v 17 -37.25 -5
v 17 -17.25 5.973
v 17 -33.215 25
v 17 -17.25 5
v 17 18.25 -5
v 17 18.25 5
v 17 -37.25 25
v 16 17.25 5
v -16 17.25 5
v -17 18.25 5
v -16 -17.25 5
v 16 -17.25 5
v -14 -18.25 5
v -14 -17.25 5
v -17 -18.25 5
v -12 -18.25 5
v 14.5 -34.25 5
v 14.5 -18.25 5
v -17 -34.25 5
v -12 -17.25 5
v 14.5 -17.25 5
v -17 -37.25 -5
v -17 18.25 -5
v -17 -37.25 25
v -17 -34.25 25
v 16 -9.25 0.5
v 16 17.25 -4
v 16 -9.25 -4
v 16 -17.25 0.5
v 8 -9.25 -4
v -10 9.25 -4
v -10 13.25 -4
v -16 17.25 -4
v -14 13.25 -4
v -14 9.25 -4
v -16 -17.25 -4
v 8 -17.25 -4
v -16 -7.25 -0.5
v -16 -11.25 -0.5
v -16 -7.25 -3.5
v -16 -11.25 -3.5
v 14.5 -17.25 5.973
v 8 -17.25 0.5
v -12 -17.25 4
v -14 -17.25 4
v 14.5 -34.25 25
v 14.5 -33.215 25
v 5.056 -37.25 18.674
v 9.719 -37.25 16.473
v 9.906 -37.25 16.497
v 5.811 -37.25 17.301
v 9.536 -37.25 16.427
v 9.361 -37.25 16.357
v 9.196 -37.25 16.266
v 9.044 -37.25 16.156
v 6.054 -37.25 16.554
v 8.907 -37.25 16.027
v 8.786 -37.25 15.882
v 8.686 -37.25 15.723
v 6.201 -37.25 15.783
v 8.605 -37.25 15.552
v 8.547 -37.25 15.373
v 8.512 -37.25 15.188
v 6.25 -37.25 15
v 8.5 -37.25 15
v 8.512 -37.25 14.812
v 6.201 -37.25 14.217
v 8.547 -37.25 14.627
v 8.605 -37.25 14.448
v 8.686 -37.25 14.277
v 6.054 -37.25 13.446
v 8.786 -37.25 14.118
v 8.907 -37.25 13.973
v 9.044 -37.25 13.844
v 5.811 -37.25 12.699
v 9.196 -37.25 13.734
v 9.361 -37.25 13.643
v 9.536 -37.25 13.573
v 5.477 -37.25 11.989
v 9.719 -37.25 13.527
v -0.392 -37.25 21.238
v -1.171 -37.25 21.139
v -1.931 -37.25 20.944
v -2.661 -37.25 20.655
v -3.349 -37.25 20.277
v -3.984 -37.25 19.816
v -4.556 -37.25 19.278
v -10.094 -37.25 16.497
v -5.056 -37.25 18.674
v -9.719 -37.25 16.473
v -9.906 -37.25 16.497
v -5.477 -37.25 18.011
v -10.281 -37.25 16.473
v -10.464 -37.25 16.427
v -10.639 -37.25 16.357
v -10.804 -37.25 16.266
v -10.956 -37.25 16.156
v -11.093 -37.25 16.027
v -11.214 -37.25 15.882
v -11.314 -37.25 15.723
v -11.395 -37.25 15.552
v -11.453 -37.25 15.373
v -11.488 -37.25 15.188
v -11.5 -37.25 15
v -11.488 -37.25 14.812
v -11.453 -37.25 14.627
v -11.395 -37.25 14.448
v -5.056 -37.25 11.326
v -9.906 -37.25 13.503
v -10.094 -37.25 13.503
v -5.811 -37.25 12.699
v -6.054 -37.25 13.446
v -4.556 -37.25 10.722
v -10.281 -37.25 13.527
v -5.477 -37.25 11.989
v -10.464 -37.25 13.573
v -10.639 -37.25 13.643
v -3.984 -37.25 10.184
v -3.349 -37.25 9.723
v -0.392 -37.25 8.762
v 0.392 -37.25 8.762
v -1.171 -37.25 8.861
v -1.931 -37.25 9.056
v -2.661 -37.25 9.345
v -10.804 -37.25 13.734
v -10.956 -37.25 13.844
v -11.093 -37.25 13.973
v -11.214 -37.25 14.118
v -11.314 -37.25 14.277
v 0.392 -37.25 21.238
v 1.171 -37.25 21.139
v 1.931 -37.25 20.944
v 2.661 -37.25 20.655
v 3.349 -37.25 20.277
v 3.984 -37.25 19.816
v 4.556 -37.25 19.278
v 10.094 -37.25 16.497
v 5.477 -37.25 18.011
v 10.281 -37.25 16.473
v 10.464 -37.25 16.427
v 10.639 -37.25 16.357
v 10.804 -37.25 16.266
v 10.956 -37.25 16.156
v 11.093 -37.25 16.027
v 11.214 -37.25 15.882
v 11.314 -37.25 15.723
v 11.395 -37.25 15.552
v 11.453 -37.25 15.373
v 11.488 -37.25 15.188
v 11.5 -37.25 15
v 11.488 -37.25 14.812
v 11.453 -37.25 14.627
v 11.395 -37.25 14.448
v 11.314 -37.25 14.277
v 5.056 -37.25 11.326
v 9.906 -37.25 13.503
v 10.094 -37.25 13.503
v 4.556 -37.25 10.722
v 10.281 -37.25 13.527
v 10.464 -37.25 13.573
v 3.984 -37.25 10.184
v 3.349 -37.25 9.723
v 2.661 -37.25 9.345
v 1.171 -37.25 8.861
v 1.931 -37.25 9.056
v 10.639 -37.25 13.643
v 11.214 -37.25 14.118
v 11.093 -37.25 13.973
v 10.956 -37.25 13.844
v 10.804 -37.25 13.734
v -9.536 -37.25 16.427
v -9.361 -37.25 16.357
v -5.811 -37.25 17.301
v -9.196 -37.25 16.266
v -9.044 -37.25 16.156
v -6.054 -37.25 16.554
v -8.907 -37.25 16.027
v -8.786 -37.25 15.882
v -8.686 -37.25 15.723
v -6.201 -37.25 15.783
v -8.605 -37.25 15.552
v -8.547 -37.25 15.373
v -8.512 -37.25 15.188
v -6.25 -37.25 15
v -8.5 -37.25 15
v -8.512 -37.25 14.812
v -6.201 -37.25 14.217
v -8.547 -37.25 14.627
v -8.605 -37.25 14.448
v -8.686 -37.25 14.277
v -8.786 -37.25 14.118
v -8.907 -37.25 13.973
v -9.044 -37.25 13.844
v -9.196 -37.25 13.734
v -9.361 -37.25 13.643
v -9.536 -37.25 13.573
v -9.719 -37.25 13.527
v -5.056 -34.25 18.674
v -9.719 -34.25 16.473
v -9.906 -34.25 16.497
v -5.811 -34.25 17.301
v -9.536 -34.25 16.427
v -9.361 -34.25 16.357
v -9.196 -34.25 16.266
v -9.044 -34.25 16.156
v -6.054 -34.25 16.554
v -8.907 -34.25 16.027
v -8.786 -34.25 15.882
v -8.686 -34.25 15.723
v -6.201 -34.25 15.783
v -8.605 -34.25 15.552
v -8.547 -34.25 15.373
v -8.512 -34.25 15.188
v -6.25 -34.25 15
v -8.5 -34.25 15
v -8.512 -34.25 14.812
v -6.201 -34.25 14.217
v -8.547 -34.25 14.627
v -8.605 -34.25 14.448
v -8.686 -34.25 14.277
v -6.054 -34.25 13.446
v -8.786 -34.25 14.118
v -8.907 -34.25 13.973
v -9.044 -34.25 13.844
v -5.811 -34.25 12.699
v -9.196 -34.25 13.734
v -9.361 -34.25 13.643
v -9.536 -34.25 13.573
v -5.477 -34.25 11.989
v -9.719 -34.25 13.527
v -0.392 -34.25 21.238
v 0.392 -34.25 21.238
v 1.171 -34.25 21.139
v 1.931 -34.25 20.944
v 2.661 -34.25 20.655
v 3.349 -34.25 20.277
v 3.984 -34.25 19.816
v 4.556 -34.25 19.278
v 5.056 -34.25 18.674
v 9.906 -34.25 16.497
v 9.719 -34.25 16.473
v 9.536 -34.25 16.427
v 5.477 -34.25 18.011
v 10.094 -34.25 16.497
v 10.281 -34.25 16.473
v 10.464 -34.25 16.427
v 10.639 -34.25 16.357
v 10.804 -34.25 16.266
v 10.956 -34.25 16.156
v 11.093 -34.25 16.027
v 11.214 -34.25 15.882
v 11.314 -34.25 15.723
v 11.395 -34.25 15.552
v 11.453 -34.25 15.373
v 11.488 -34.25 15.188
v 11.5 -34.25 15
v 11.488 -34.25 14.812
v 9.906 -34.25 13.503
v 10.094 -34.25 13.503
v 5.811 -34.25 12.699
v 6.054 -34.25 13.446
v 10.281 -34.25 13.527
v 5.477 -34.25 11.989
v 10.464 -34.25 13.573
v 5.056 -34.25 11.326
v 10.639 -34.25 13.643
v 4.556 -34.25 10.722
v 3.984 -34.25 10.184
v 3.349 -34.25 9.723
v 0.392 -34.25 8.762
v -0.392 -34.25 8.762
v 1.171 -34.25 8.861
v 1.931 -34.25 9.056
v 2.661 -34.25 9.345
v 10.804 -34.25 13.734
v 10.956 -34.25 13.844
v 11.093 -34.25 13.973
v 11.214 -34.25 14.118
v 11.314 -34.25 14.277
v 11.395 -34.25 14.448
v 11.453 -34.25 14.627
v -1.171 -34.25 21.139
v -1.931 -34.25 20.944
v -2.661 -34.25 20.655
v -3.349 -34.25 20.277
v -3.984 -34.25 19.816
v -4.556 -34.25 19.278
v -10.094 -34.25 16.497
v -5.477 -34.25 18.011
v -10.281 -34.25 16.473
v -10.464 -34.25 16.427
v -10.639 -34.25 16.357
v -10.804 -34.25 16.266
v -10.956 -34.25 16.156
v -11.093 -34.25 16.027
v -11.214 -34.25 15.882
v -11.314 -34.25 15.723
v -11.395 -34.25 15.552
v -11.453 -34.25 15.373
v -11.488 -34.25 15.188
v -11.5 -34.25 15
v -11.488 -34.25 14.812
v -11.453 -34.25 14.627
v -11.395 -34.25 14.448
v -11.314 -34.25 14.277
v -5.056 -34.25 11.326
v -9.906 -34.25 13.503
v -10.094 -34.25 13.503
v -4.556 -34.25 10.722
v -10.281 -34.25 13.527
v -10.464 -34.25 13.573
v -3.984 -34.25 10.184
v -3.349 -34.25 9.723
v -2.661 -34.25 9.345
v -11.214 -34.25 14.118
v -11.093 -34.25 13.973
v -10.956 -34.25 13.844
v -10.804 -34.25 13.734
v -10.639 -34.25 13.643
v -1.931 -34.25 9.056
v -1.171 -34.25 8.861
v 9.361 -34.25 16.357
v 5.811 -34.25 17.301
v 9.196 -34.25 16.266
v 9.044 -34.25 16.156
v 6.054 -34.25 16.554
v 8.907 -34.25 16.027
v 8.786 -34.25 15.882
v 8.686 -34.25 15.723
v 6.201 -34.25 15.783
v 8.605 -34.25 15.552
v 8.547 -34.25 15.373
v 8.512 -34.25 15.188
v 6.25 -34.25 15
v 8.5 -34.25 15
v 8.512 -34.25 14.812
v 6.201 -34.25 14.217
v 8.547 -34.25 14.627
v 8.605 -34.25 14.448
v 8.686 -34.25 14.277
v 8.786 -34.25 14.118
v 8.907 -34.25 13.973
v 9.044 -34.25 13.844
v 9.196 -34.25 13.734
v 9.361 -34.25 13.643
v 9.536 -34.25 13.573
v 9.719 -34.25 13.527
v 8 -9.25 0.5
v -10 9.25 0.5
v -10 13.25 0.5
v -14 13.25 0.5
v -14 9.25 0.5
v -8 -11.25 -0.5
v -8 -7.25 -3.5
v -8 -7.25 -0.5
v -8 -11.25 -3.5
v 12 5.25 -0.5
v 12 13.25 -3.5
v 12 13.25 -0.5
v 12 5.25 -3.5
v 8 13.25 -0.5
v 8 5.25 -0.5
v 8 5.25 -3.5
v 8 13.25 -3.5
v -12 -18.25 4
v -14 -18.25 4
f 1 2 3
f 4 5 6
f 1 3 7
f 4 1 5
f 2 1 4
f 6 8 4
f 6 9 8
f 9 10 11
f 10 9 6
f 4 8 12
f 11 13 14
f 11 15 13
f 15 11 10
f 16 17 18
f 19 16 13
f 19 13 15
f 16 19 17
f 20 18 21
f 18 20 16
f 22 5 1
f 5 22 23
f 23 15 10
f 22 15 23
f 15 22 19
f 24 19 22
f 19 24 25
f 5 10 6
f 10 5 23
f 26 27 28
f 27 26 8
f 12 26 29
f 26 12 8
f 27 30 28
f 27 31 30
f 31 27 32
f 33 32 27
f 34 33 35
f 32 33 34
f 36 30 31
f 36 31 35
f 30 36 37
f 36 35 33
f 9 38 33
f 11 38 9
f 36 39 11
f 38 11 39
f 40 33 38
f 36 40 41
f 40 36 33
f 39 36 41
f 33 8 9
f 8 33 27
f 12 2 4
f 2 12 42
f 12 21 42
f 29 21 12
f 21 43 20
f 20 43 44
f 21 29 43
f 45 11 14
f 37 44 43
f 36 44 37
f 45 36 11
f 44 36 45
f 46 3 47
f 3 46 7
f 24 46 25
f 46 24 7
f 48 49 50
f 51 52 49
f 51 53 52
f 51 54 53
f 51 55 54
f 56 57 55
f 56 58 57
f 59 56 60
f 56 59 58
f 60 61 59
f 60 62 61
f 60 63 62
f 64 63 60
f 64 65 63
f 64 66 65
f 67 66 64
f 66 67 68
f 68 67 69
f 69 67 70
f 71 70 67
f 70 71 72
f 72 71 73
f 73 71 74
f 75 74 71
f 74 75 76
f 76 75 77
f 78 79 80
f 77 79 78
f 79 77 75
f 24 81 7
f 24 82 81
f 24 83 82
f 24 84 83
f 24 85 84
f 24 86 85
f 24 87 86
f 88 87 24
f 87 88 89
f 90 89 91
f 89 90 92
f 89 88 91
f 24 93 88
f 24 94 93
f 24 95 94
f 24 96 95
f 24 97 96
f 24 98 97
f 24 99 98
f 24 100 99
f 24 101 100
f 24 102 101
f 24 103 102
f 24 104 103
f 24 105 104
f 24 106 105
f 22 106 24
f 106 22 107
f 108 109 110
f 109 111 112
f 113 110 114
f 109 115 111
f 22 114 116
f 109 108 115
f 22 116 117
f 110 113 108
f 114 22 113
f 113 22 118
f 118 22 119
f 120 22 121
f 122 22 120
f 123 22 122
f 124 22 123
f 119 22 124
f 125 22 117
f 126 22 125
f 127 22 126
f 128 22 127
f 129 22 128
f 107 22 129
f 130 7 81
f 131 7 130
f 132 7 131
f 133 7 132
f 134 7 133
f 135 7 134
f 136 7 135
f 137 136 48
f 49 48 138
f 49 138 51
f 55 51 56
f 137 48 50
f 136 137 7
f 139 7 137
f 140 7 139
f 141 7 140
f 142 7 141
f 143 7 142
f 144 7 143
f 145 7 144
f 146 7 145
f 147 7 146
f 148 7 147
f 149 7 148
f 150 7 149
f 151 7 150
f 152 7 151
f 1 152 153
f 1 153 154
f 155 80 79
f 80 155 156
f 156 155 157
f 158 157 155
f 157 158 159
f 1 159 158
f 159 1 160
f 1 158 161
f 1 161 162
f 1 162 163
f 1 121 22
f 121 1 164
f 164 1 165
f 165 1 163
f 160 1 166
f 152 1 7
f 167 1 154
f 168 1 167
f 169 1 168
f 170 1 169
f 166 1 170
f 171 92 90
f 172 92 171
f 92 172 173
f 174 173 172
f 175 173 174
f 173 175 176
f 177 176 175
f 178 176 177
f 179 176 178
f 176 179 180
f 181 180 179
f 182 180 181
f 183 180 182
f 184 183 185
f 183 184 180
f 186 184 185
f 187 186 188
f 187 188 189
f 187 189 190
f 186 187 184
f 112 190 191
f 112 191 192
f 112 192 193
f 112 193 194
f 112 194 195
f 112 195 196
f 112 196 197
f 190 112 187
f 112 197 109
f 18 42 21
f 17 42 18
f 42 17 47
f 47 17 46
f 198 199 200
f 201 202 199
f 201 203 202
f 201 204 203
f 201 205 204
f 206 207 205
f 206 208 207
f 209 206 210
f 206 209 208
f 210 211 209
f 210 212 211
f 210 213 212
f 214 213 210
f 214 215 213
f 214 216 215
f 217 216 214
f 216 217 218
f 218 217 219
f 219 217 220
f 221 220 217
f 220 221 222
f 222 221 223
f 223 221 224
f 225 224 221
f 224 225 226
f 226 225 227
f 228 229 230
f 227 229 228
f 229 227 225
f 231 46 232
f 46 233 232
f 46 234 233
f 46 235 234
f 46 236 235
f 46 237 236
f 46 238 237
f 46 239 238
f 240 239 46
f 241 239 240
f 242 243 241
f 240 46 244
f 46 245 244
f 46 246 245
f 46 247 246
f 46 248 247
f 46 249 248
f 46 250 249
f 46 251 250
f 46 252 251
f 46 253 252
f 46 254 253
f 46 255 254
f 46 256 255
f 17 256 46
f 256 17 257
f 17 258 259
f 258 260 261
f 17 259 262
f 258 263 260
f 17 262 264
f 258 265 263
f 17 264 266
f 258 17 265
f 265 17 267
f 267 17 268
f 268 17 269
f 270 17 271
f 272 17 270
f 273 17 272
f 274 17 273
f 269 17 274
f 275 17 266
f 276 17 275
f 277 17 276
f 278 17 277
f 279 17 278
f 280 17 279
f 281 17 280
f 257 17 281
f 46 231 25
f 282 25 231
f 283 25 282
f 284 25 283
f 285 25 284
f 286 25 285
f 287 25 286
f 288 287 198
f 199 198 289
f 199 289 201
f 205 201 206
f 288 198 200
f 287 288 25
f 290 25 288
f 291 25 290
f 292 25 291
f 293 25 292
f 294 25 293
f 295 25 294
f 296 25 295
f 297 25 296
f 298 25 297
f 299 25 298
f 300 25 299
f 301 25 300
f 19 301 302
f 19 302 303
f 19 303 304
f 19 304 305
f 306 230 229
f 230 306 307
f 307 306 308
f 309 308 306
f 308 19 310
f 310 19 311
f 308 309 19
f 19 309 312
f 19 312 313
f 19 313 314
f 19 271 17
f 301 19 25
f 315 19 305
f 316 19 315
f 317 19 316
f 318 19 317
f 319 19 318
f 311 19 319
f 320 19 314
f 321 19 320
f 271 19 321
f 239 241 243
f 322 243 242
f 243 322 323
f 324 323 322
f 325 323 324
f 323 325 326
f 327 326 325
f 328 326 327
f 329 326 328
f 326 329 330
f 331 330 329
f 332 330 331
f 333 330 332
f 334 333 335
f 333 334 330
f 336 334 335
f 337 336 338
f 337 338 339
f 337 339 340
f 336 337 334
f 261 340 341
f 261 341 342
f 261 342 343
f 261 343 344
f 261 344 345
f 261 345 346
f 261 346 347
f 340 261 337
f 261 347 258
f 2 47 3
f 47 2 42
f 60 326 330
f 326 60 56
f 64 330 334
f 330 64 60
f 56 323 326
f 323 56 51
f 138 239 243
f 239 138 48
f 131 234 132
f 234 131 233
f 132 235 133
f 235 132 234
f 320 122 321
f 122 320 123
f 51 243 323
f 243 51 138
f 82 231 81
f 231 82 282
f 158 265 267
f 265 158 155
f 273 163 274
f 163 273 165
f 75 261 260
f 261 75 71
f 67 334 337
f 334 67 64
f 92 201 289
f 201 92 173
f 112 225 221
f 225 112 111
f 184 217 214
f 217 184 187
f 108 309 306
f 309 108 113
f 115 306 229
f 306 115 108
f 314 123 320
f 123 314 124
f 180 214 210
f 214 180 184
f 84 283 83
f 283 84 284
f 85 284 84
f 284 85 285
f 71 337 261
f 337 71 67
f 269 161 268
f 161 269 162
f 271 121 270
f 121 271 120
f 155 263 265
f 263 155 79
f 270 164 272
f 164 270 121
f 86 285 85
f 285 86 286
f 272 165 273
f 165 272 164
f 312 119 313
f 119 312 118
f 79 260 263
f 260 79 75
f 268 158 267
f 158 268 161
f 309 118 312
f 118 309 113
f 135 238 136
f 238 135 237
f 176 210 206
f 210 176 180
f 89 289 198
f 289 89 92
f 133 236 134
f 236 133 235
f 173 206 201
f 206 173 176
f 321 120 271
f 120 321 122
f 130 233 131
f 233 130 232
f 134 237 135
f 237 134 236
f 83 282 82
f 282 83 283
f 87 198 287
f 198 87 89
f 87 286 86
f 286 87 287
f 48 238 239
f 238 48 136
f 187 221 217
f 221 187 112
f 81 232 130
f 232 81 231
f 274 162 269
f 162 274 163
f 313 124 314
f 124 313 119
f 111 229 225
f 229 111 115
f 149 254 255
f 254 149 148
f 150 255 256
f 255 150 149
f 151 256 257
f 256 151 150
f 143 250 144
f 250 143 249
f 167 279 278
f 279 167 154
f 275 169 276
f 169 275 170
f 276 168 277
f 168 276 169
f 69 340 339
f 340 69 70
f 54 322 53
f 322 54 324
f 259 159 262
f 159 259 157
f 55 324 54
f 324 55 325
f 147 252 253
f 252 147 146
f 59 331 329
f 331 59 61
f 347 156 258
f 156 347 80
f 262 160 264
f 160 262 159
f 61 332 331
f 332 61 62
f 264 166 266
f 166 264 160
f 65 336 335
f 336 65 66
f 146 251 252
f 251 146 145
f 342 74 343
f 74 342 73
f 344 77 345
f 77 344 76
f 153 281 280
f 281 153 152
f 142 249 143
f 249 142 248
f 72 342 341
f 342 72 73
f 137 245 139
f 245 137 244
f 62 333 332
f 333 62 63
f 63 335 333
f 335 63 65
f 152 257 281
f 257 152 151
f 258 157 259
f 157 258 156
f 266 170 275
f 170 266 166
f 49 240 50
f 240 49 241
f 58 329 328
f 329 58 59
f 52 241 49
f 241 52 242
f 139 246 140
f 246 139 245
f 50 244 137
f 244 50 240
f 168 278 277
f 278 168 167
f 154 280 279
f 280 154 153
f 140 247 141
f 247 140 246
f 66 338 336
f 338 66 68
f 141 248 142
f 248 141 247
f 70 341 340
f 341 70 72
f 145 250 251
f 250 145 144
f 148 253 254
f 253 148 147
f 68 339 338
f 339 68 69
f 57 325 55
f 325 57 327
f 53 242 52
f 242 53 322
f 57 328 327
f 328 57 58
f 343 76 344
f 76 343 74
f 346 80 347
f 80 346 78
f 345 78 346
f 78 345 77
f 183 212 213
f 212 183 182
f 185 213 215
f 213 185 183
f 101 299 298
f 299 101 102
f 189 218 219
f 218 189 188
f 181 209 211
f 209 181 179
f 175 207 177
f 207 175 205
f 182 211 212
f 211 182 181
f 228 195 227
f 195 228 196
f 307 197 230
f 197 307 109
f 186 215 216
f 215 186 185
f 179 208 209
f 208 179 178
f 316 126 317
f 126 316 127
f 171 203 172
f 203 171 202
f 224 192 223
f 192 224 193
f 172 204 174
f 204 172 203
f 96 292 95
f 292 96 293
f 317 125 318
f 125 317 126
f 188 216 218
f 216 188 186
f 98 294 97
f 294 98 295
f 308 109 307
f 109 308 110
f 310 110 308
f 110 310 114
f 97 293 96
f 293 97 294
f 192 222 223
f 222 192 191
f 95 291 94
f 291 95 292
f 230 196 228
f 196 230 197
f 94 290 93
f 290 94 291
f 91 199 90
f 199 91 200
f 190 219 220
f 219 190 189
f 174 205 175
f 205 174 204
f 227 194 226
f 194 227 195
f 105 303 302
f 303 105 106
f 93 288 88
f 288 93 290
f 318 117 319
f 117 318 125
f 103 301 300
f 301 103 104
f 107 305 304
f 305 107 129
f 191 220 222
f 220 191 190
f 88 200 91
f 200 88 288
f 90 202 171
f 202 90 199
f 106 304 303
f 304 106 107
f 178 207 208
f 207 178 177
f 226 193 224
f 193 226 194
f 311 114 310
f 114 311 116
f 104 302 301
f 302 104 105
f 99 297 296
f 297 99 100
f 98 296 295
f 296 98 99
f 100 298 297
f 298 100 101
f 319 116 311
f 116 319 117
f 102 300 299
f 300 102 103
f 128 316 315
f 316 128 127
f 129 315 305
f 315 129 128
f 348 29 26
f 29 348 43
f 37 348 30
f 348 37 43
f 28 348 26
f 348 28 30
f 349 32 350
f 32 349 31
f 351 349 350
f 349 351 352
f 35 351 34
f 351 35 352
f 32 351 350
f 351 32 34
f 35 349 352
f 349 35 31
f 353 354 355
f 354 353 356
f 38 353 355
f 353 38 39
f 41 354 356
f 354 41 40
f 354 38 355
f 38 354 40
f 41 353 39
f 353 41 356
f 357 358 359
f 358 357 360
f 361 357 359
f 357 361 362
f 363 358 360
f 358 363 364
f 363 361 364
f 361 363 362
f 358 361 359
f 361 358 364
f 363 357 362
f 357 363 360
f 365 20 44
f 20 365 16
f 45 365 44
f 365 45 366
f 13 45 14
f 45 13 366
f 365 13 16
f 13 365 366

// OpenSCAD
inner_width = 32;
inner_length = 34.5;
inner_height = 10;
wall_width = 2;
floor_height = 1;


difference() {
  union() {
    difference() {
      cube([inner_width+wall_width, inner_length+wall_width, inner_height], center=true);
      translate([0,0,floor_height]) {
        cube([inner_width, inner_length, inner_height], center=true); 
      }
    }

    // anchors
    translate([(inner_width/2)-4,-(inner_length/2)+4,-2]) cube([8, 8, 5], center=true);
    translate([-(inner_width/2)+4,(inner_length/2)-6,-2]) cube([4, 4, 5], center=true);
    translate([-(inner_width/2)+4,-(inner_length/2)+8,-2]) cube([8, 4, 3], center=true);
    translate([(inner_width/2)-6,(inner_length/2)-8,-2]) cube([4, 8, 3], center=true);

    // sidecar

    difference() {
      translate([0,-27.25,0]) {
        difference() {
          translate([0,0,inner_height]) cube([inner_width+wall_width,20,inner_height*3], center=true);
          translate([-2,2,(inner_height)*1.55]) cube([inner_width+wall_width-1,18,(inner_height*2)+1], center=true);
          rotate([-50,0,0]) {
            translate([2,-10,(inner_height)*2.15]) cube([inner_width*2,inner_height*4,inner_height*2], center=true);
          }
        }
      }

      translate([0,-36,15]) {
        rotate([90,0,0]) {
          cylinder(h=4, d=12.5, center=true, $fn=50);
          translate([10,0,0]) cylinder(h=4, d=3, center=true, $fn=50);
          translate([-10,0,0]) cylinder(h=4, d=3, center=true, $fn=50);
        }
      }
    }
  }
  // isp notch
  translate([-13,-(inner_length/2),inner_height/2]) {
    cube([2,2,2], center=true);
  }
}
